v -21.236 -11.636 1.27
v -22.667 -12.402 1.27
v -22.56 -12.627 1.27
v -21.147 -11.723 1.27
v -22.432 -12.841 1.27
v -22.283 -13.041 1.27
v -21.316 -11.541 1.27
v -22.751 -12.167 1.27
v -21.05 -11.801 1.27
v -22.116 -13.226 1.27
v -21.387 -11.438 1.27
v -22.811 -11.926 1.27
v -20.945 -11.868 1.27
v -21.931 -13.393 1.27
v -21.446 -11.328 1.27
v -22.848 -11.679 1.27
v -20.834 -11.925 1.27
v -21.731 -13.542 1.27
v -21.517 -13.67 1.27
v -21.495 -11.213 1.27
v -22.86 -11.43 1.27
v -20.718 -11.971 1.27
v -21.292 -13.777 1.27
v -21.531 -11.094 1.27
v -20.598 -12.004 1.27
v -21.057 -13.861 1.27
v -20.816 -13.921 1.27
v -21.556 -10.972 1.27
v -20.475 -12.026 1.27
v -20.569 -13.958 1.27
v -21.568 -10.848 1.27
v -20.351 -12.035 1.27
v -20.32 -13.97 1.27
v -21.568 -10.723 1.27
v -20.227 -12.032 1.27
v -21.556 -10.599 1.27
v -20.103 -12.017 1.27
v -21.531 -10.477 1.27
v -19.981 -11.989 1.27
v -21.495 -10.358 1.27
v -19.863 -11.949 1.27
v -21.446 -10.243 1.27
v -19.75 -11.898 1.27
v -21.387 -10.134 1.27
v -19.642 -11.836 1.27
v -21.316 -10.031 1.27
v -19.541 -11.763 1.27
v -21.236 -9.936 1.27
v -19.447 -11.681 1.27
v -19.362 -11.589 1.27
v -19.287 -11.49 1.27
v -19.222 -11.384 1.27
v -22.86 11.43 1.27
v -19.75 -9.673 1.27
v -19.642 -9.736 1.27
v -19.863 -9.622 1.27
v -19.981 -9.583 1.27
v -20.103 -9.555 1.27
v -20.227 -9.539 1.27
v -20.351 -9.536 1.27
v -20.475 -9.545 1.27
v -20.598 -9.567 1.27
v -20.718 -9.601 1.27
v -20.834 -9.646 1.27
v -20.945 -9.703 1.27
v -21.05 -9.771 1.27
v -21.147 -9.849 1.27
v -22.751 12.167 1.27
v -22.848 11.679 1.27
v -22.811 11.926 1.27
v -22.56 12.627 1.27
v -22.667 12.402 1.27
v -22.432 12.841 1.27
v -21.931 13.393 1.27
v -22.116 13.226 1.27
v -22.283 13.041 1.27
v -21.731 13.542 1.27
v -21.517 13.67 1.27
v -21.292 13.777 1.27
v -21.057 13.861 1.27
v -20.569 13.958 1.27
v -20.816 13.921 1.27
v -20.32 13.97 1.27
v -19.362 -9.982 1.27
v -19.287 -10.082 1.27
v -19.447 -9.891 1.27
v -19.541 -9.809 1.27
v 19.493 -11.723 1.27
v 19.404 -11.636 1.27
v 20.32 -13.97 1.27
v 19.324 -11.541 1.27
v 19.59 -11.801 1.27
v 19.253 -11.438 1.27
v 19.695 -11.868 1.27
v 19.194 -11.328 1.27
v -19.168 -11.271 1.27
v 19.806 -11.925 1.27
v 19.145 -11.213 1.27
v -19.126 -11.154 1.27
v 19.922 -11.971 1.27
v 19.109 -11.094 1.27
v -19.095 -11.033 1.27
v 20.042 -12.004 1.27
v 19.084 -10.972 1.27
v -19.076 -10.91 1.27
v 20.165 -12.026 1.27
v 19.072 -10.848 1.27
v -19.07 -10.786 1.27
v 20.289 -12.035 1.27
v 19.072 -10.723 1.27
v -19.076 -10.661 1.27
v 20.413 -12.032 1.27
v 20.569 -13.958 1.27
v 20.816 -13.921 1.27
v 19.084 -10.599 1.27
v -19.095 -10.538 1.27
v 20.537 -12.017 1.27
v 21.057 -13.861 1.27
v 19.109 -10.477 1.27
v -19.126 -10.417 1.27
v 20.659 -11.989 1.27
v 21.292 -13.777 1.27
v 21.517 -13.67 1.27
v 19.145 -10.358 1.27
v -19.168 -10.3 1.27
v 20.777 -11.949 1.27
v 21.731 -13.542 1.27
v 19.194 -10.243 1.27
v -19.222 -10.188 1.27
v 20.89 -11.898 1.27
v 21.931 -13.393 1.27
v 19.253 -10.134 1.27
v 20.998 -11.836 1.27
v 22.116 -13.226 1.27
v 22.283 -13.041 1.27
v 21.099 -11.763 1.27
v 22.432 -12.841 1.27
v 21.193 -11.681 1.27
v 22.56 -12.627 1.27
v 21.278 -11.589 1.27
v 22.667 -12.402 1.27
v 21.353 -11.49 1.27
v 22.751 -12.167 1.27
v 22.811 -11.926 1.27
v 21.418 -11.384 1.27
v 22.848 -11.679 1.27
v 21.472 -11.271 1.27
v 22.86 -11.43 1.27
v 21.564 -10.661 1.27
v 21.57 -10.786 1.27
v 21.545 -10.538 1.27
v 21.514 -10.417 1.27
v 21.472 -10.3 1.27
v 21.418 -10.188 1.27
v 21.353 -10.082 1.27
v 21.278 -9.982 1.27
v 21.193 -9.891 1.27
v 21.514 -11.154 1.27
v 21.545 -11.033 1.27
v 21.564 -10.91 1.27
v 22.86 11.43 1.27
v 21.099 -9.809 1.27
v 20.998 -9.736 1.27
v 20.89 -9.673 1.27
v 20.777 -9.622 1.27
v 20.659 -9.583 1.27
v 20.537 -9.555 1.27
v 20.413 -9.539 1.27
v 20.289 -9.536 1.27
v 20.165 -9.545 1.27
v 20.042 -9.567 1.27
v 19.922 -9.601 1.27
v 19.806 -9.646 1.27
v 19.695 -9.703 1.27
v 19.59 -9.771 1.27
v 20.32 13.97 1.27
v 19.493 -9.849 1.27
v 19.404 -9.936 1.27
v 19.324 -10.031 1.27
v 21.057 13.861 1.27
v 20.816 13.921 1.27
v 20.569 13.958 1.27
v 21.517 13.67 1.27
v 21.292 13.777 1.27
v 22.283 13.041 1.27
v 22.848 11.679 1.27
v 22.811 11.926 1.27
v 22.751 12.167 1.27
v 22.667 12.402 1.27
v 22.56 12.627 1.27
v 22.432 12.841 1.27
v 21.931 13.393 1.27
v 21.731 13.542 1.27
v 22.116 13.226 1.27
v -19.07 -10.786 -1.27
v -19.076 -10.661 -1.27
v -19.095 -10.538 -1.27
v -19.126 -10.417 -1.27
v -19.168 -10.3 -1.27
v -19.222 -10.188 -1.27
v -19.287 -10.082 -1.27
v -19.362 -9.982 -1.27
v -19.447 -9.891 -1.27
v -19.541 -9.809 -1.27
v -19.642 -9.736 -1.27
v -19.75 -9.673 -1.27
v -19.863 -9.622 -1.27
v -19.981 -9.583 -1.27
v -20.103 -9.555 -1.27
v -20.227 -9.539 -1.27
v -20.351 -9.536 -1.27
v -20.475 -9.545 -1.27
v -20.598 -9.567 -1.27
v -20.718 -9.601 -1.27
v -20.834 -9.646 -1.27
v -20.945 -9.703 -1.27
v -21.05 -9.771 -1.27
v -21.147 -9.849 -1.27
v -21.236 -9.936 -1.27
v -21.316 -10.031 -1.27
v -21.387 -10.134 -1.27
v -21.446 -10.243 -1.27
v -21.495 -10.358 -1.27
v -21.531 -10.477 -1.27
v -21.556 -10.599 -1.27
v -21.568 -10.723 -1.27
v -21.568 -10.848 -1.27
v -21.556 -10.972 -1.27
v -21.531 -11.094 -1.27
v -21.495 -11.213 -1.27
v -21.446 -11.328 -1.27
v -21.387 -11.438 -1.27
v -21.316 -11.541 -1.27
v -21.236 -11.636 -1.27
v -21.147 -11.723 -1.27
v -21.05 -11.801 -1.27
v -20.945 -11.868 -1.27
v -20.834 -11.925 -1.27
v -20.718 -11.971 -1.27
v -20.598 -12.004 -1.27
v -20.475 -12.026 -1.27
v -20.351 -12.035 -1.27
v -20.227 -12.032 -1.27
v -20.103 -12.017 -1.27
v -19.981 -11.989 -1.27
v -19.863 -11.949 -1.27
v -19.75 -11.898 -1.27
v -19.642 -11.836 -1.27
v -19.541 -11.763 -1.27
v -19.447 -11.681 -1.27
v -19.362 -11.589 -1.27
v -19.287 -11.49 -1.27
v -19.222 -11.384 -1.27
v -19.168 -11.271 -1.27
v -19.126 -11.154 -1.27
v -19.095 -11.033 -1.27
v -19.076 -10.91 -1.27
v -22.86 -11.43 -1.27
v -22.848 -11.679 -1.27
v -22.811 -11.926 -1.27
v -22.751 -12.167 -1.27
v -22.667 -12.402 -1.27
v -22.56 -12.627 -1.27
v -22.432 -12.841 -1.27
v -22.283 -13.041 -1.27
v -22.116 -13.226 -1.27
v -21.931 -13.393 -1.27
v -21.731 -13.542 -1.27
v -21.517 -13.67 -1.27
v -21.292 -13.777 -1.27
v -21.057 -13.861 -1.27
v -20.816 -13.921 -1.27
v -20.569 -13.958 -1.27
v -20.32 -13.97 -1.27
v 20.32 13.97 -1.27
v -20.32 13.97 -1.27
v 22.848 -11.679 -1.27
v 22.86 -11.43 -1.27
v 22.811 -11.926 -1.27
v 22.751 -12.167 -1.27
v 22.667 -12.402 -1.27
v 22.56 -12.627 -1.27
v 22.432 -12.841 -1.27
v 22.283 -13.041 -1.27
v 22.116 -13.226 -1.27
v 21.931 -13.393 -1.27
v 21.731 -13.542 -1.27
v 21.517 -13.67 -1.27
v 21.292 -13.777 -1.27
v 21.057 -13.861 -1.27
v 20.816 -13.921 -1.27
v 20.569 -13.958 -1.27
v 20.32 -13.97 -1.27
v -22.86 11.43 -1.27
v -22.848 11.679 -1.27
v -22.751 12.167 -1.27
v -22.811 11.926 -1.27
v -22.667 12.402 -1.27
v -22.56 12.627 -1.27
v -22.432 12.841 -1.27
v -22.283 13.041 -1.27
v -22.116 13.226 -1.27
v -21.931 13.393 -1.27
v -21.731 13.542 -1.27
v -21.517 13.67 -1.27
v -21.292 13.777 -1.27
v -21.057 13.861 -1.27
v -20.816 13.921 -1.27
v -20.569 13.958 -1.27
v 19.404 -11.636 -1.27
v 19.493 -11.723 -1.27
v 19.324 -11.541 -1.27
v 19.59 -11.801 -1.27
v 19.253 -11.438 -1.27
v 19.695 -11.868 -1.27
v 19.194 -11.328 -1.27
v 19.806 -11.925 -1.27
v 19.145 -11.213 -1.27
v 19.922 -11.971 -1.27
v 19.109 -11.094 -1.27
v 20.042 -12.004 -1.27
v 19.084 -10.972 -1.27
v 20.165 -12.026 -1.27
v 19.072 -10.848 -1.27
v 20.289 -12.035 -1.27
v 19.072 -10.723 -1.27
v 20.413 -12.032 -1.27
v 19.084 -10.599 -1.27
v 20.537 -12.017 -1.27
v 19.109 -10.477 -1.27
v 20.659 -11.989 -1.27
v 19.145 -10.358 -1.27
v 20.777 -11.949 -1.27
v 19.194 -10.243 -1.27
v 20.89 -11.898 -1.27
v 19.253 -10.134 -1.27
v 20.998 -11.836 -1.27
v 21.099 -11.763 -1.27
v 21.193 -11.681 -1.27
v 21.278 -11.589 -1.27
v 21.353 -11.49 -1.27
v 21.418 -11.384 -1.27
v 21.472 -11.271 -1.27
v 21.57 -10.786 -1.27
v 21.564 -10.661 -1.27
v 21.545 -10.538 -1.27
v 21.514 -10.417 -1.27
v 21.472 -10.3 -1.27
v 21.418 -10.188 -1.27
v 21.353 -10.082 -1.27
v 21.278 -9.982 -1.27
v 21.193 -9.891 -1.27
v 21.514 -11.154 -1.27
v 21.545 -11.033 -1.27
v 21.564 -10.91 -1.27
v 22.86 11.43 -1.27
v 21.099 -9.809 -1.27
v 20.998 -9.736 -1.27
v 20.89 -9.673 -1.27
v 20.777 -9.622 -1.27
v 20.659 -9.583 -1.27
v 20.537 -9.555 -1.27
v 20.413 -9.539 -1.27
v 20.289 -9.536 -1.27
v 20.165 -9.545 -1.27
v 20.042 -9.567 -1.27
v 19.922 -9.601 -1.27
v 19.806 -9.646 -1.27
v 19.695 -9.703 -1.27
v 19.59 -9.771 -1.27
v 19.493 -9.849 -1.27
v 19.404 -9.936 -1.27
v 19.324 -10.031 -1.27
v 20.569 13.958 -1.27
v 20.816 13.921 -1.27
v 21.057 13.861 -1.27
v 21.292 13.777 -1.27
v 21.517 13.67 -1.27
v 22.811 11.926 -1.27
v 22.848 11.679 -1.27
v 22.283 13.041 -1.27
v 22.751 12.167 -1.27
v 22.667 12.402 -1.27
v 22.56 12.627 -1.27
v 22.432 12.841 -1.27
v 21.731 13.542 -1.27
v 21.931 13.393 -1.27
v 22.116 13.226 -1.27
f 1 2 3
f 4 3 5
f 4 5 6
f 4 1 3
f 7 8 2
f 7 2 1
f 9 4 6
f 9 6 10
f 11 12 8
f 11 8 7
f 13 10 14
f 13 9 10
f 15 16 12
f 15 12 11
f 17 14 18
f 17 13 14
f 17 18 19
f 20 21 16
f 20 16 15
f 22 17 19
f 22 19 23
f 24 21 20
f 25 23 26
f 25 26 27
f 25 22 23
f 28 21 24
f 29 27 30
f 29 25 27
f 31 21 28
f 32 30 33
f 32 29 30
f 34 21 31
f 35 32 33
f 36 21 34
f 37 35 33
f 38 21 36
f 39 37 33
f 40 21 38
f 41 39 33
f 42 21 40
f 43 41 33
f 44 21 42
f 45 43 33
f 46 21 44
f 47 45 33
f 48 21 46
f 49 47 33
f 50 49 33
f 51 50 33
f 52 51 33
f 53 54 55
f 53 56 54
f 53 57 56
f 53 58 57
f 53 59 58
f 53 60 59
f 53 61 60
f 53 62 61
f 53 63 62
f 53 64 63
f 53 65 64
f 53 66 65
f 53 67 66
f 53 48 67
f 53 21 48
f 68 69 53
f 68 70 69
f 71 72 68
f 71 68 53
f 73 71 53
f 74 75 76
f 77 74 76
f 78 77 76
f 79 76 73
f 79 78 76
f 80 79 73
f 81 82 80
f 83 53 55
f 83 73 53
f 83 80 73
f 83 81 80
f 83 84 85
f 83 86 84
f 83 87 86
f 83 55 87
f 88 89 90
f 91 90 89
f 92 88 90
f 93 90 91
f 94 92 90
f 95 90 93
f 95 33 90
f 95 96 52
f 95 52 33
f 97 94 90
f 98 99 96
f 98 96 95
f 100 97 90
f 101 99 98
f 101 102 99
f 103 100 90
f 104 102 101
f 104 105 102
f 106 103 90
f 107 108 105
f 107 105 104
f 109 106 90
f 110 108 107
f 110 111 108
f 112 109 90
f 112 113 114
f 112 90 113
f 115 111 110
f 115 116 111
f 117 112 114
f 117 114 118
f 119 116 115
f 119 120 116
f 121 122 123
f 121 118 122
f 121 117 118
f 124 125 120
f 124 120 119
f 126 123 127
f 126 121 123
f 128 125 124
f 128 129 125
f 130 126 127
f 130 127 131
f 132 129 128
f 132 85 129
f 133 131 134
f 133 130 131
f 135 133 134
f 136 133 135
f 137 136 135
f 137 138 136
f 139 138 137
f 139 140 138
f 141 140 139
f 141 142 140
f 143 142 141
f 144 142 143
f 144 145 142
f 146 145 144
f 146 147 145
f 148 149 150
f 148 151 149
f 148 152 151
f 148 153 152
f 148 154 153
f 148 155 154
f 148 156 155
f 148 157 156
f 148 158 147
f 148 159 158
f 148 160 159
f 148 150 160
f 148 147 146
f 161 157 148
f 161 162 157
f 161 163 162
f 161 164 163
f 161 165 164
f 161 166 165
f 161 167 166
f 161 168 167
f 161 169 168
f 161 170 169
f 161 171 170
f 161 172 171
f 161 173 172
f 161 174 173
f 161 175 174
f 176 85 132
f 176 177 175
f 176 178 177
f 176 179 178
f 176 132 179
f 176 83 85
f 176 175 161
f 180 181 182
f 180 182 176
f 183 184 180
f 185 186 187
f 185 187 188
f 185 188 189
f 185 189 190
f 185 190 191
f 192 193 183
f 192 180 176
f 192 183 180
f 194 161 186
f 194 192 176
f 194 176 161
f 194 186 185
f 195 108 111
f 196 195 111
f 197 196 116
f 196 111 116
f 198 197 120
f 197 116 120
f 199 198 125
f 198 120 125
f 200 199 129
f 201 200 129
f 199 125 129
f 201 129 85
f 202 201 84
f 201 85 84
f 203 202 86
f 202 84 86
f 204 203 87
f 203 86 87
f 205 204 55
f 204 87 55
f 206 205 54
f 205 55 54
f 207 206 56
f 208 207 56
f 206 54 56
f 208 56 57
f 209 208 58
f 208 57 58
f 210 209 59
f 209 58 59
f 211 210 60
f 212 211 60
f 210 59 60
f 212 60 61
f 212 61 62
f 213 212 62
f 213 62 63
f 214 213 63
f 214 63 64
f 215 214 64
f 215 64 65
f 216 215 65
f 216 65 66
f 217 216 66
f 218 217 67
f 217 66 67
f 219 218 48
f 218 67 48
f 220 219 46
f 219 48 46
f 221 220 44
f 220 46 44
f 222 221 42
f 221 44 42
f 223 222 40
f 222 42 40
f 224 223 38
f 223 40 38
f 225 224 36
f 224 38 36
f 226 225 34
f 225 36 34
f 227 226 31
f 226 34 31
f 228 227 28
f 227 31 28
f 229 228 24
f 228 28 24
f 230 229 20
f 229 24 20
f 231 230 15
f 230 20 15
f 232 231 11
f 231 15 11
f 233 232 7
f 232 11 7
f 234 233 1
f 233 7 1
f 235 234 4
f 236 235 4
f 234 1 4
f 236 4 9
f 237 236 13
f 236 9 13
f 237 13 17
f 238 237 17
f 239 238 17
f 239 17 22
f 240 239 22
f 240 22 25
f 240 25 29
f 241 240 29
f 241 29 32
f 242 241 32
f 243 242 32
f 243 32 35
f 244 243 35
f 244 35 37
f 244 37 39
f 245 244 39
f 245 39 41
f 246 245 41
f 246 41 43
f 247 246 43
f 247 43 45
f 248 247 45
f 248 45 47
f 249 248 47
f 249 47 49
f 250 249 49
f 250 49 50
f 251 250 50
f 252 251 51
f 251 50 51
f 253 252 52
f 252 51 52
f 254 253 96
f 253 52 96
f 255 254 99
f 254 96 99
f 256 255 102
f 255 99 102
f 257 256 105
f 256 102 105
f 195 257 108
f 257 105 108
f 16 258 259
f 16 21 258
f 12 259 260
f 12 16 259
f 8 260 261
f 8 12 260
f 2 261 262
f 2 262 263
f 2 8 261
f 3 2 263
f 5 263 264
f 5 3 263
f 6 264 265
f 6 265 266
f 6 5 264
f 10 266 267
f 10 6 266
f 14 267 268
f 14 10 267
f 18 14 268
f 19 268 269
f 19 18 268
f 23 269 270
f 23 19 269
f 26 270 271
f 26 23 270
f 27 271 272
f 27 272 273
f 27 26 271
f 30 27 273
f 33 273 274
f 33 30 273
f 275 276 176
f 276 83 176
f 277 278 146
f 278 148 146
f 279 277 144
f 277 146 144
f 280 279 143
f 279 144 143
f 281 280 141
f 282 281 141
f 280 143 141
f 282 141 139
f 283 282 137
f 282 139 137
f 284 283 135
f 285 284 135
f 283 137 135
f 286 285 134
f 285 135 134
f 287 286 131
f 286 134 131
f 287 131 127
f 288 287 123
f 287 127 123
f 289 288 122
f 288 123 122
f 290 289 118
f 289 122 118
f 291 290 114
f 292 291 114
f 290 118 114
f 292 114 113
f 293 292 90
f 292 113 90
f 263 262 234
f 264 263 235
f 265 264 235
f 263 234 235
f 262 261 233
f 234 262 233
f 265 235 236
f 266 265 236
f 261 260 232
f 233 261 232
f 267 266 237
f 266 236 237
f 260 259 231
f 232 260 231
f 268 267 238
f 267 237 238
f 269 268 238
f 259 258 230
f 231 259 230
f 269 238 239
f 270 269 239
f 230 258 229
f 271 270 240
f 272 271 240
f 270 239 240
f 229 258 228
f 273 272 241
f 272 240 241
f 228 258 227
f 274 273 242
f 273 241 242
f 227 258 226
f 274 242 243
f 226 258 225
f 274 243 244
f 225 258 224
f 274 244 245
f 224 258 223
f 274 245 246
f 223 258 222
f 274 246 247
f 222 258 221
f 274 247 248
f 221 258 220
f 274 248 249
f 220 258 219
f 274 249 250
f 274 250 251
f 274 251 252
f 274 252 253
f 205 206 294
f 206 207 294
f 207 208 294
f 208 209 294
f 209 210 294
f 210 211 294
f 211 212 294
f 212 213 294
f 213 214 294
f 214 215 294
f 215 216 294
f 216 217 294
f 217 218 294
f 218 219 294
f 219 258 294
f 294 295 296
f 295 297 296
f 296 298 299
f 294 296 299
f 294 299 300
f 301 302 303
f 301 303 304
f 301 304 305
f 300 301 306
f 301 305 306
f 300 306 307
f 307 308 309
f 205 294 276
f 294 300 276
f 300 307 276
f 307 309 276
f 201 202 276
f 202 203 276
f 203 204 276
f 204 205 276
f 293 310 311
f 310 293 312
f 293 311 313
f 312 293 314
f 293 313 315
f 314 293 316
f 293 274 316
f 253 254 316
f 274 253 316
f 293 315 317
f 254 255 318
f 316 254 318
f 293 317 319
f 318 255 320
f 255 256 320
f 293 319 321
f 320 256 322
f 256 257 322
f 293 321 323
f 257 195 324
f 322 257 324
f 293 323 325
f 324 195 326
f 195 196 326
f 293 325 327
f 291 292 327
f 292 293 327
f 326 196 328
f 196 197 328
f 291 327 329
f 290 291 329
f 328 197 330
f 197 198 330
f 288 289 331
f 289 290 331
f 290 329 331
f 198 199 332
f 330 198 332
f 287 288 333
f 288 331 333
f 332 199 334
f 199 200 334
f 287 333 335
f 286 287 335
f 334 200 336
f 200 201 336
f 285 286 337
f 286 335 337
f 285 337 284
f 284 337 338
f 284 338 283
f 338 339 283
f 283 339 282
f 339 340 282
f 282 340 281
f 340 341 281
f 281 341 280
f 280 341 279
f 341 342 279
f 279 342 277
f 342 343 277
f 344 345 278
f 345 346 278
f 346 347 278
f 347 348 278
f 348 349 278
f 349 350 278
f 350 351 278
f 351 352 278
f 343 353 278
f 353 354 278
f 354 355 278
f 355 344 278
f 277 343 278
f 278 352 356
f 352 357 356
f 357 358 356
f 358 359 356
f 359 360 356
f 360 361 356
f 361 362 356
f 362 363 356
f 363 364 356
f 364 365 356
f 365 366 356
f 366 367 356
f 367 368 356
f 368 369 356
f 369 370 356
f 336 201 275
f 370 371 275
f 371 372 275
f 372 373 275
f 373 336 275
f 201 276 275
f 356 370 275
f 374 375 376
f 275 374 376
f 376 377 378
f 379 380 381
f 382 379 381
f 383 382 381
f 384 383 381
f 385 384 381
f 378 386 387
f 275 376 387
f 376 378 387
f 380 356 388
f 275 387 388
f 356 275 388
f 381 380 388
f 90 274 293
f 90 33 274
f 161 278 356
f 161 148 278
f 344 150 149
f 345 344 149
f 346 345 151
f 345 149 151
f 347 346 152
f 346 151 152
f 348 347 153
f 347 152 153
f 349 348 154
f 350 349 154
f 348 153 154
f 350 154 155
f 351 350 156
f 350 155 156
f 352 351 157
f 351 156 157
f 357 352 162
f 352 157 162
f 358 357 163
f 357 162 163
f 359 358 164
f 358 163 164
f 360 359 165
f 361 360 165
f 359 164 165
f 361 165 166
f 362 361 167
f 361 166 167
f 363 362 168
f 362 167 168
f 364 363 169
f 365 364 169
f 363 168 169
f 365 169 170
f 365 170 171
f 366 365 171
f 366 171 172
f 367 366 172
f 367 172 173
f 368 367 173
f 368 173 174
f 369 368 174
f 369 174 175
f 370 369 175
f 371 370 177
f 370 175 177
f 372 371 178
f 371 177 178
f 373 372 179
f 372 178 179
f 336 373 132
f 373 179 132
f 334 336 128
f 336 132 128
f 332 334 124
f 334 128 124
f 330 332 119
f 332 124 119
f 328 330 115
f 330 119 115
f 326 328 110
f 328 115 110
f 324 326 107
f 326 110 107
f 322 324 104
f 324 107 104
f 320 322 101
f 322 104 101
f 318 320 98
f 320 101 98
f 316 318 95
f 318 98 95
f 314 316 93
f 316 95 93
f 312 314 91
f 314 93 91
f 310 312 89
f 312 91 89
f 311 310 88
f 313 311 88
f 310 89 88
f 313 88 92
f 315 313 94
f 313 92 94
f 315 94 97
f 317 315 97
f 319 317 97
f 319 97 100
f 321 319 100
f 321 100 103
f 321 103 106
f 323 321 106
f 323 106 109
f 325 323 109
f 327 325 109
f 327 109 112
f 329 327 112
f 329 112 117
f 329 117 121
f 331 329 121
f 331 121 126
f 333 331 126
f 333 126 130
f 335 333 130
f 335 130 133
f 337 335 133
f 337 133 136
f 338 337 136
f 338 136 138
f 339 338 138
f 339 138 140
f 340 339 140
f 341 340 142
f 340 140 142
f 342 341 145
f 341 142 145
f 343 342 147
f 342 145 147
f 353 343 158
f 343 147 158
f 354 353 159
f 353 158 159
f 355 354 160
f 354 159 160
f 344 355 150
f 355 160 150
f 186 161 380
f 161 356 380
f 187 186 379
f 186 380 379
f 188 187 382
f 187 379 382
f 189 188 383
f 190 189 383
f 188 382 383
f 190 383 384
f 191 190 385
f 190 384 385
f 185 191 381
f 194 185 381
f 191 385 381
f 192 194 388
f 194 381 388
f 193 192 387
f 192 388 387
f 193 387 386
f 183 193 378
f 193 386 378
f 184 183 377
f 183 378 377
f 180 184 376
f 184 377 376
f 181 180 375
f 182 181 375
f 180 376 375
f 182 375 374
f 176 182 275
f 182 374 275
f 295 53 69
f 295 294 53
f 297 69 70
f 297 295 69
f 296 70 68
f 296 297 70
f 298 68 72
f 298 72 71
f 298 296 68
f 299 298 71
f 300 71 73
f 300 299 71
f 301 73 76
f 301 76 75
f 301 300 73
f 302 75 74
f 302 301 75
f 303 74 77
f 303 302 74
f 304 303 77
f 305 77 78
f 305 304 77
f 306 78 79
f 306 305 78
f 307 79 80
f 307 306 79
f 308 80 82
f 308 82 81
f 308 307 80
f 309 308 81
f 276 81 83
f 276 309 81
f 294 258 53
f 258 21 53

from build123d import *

# Parameters (mm, degrees)
SKETCH1_W           = 45.72
SKETCH1_H           = 27.94
BOSS_EXTRUDE1_DEPTH = 1.27
FILLET1_R           = 2.54
SKETCH2_R           = 1.25
CUT_EXTRUDE1_DEPTH  = 2.54


with BuildPart() as part:
    # Sketch1 → Boss-Extrude1 (new body, symmetric)
    with BuildSketch(Plane.XY):
        Rectangle(SKETCH1_W, SKETCH1_H)
    extrude(amount=BOSS_EXTRUDE1_DEPTH, both=True)

    # Fillet1
    fillet1_edges = [part.edges().sort_by_distance(p)[0] for p in [
        (22.86, -13.97, 0),
        (-22.86, -13.97, 0),
        (-22.86, 13.97, 0),
        (22.86, 13.97, 0),
    ]]
    fillet(fillet1_edges, radius=FILLET1_R)

    # Sketch2 → Cut-Extrude1 (cut)
    with BuildSketch(Plane.XY.offset(1.27)):
        with Locations((-20.32, -10.785792079)):
            Circle(SKETCH2_R)
        with Locations((20.32, -10.785792079)):
            Circle(SKETCH2_R)
    extrude(amount=-CUT_EXTRUDE1_DEPTH, mode=Mode.SUBTRACT)


solid = part.part
